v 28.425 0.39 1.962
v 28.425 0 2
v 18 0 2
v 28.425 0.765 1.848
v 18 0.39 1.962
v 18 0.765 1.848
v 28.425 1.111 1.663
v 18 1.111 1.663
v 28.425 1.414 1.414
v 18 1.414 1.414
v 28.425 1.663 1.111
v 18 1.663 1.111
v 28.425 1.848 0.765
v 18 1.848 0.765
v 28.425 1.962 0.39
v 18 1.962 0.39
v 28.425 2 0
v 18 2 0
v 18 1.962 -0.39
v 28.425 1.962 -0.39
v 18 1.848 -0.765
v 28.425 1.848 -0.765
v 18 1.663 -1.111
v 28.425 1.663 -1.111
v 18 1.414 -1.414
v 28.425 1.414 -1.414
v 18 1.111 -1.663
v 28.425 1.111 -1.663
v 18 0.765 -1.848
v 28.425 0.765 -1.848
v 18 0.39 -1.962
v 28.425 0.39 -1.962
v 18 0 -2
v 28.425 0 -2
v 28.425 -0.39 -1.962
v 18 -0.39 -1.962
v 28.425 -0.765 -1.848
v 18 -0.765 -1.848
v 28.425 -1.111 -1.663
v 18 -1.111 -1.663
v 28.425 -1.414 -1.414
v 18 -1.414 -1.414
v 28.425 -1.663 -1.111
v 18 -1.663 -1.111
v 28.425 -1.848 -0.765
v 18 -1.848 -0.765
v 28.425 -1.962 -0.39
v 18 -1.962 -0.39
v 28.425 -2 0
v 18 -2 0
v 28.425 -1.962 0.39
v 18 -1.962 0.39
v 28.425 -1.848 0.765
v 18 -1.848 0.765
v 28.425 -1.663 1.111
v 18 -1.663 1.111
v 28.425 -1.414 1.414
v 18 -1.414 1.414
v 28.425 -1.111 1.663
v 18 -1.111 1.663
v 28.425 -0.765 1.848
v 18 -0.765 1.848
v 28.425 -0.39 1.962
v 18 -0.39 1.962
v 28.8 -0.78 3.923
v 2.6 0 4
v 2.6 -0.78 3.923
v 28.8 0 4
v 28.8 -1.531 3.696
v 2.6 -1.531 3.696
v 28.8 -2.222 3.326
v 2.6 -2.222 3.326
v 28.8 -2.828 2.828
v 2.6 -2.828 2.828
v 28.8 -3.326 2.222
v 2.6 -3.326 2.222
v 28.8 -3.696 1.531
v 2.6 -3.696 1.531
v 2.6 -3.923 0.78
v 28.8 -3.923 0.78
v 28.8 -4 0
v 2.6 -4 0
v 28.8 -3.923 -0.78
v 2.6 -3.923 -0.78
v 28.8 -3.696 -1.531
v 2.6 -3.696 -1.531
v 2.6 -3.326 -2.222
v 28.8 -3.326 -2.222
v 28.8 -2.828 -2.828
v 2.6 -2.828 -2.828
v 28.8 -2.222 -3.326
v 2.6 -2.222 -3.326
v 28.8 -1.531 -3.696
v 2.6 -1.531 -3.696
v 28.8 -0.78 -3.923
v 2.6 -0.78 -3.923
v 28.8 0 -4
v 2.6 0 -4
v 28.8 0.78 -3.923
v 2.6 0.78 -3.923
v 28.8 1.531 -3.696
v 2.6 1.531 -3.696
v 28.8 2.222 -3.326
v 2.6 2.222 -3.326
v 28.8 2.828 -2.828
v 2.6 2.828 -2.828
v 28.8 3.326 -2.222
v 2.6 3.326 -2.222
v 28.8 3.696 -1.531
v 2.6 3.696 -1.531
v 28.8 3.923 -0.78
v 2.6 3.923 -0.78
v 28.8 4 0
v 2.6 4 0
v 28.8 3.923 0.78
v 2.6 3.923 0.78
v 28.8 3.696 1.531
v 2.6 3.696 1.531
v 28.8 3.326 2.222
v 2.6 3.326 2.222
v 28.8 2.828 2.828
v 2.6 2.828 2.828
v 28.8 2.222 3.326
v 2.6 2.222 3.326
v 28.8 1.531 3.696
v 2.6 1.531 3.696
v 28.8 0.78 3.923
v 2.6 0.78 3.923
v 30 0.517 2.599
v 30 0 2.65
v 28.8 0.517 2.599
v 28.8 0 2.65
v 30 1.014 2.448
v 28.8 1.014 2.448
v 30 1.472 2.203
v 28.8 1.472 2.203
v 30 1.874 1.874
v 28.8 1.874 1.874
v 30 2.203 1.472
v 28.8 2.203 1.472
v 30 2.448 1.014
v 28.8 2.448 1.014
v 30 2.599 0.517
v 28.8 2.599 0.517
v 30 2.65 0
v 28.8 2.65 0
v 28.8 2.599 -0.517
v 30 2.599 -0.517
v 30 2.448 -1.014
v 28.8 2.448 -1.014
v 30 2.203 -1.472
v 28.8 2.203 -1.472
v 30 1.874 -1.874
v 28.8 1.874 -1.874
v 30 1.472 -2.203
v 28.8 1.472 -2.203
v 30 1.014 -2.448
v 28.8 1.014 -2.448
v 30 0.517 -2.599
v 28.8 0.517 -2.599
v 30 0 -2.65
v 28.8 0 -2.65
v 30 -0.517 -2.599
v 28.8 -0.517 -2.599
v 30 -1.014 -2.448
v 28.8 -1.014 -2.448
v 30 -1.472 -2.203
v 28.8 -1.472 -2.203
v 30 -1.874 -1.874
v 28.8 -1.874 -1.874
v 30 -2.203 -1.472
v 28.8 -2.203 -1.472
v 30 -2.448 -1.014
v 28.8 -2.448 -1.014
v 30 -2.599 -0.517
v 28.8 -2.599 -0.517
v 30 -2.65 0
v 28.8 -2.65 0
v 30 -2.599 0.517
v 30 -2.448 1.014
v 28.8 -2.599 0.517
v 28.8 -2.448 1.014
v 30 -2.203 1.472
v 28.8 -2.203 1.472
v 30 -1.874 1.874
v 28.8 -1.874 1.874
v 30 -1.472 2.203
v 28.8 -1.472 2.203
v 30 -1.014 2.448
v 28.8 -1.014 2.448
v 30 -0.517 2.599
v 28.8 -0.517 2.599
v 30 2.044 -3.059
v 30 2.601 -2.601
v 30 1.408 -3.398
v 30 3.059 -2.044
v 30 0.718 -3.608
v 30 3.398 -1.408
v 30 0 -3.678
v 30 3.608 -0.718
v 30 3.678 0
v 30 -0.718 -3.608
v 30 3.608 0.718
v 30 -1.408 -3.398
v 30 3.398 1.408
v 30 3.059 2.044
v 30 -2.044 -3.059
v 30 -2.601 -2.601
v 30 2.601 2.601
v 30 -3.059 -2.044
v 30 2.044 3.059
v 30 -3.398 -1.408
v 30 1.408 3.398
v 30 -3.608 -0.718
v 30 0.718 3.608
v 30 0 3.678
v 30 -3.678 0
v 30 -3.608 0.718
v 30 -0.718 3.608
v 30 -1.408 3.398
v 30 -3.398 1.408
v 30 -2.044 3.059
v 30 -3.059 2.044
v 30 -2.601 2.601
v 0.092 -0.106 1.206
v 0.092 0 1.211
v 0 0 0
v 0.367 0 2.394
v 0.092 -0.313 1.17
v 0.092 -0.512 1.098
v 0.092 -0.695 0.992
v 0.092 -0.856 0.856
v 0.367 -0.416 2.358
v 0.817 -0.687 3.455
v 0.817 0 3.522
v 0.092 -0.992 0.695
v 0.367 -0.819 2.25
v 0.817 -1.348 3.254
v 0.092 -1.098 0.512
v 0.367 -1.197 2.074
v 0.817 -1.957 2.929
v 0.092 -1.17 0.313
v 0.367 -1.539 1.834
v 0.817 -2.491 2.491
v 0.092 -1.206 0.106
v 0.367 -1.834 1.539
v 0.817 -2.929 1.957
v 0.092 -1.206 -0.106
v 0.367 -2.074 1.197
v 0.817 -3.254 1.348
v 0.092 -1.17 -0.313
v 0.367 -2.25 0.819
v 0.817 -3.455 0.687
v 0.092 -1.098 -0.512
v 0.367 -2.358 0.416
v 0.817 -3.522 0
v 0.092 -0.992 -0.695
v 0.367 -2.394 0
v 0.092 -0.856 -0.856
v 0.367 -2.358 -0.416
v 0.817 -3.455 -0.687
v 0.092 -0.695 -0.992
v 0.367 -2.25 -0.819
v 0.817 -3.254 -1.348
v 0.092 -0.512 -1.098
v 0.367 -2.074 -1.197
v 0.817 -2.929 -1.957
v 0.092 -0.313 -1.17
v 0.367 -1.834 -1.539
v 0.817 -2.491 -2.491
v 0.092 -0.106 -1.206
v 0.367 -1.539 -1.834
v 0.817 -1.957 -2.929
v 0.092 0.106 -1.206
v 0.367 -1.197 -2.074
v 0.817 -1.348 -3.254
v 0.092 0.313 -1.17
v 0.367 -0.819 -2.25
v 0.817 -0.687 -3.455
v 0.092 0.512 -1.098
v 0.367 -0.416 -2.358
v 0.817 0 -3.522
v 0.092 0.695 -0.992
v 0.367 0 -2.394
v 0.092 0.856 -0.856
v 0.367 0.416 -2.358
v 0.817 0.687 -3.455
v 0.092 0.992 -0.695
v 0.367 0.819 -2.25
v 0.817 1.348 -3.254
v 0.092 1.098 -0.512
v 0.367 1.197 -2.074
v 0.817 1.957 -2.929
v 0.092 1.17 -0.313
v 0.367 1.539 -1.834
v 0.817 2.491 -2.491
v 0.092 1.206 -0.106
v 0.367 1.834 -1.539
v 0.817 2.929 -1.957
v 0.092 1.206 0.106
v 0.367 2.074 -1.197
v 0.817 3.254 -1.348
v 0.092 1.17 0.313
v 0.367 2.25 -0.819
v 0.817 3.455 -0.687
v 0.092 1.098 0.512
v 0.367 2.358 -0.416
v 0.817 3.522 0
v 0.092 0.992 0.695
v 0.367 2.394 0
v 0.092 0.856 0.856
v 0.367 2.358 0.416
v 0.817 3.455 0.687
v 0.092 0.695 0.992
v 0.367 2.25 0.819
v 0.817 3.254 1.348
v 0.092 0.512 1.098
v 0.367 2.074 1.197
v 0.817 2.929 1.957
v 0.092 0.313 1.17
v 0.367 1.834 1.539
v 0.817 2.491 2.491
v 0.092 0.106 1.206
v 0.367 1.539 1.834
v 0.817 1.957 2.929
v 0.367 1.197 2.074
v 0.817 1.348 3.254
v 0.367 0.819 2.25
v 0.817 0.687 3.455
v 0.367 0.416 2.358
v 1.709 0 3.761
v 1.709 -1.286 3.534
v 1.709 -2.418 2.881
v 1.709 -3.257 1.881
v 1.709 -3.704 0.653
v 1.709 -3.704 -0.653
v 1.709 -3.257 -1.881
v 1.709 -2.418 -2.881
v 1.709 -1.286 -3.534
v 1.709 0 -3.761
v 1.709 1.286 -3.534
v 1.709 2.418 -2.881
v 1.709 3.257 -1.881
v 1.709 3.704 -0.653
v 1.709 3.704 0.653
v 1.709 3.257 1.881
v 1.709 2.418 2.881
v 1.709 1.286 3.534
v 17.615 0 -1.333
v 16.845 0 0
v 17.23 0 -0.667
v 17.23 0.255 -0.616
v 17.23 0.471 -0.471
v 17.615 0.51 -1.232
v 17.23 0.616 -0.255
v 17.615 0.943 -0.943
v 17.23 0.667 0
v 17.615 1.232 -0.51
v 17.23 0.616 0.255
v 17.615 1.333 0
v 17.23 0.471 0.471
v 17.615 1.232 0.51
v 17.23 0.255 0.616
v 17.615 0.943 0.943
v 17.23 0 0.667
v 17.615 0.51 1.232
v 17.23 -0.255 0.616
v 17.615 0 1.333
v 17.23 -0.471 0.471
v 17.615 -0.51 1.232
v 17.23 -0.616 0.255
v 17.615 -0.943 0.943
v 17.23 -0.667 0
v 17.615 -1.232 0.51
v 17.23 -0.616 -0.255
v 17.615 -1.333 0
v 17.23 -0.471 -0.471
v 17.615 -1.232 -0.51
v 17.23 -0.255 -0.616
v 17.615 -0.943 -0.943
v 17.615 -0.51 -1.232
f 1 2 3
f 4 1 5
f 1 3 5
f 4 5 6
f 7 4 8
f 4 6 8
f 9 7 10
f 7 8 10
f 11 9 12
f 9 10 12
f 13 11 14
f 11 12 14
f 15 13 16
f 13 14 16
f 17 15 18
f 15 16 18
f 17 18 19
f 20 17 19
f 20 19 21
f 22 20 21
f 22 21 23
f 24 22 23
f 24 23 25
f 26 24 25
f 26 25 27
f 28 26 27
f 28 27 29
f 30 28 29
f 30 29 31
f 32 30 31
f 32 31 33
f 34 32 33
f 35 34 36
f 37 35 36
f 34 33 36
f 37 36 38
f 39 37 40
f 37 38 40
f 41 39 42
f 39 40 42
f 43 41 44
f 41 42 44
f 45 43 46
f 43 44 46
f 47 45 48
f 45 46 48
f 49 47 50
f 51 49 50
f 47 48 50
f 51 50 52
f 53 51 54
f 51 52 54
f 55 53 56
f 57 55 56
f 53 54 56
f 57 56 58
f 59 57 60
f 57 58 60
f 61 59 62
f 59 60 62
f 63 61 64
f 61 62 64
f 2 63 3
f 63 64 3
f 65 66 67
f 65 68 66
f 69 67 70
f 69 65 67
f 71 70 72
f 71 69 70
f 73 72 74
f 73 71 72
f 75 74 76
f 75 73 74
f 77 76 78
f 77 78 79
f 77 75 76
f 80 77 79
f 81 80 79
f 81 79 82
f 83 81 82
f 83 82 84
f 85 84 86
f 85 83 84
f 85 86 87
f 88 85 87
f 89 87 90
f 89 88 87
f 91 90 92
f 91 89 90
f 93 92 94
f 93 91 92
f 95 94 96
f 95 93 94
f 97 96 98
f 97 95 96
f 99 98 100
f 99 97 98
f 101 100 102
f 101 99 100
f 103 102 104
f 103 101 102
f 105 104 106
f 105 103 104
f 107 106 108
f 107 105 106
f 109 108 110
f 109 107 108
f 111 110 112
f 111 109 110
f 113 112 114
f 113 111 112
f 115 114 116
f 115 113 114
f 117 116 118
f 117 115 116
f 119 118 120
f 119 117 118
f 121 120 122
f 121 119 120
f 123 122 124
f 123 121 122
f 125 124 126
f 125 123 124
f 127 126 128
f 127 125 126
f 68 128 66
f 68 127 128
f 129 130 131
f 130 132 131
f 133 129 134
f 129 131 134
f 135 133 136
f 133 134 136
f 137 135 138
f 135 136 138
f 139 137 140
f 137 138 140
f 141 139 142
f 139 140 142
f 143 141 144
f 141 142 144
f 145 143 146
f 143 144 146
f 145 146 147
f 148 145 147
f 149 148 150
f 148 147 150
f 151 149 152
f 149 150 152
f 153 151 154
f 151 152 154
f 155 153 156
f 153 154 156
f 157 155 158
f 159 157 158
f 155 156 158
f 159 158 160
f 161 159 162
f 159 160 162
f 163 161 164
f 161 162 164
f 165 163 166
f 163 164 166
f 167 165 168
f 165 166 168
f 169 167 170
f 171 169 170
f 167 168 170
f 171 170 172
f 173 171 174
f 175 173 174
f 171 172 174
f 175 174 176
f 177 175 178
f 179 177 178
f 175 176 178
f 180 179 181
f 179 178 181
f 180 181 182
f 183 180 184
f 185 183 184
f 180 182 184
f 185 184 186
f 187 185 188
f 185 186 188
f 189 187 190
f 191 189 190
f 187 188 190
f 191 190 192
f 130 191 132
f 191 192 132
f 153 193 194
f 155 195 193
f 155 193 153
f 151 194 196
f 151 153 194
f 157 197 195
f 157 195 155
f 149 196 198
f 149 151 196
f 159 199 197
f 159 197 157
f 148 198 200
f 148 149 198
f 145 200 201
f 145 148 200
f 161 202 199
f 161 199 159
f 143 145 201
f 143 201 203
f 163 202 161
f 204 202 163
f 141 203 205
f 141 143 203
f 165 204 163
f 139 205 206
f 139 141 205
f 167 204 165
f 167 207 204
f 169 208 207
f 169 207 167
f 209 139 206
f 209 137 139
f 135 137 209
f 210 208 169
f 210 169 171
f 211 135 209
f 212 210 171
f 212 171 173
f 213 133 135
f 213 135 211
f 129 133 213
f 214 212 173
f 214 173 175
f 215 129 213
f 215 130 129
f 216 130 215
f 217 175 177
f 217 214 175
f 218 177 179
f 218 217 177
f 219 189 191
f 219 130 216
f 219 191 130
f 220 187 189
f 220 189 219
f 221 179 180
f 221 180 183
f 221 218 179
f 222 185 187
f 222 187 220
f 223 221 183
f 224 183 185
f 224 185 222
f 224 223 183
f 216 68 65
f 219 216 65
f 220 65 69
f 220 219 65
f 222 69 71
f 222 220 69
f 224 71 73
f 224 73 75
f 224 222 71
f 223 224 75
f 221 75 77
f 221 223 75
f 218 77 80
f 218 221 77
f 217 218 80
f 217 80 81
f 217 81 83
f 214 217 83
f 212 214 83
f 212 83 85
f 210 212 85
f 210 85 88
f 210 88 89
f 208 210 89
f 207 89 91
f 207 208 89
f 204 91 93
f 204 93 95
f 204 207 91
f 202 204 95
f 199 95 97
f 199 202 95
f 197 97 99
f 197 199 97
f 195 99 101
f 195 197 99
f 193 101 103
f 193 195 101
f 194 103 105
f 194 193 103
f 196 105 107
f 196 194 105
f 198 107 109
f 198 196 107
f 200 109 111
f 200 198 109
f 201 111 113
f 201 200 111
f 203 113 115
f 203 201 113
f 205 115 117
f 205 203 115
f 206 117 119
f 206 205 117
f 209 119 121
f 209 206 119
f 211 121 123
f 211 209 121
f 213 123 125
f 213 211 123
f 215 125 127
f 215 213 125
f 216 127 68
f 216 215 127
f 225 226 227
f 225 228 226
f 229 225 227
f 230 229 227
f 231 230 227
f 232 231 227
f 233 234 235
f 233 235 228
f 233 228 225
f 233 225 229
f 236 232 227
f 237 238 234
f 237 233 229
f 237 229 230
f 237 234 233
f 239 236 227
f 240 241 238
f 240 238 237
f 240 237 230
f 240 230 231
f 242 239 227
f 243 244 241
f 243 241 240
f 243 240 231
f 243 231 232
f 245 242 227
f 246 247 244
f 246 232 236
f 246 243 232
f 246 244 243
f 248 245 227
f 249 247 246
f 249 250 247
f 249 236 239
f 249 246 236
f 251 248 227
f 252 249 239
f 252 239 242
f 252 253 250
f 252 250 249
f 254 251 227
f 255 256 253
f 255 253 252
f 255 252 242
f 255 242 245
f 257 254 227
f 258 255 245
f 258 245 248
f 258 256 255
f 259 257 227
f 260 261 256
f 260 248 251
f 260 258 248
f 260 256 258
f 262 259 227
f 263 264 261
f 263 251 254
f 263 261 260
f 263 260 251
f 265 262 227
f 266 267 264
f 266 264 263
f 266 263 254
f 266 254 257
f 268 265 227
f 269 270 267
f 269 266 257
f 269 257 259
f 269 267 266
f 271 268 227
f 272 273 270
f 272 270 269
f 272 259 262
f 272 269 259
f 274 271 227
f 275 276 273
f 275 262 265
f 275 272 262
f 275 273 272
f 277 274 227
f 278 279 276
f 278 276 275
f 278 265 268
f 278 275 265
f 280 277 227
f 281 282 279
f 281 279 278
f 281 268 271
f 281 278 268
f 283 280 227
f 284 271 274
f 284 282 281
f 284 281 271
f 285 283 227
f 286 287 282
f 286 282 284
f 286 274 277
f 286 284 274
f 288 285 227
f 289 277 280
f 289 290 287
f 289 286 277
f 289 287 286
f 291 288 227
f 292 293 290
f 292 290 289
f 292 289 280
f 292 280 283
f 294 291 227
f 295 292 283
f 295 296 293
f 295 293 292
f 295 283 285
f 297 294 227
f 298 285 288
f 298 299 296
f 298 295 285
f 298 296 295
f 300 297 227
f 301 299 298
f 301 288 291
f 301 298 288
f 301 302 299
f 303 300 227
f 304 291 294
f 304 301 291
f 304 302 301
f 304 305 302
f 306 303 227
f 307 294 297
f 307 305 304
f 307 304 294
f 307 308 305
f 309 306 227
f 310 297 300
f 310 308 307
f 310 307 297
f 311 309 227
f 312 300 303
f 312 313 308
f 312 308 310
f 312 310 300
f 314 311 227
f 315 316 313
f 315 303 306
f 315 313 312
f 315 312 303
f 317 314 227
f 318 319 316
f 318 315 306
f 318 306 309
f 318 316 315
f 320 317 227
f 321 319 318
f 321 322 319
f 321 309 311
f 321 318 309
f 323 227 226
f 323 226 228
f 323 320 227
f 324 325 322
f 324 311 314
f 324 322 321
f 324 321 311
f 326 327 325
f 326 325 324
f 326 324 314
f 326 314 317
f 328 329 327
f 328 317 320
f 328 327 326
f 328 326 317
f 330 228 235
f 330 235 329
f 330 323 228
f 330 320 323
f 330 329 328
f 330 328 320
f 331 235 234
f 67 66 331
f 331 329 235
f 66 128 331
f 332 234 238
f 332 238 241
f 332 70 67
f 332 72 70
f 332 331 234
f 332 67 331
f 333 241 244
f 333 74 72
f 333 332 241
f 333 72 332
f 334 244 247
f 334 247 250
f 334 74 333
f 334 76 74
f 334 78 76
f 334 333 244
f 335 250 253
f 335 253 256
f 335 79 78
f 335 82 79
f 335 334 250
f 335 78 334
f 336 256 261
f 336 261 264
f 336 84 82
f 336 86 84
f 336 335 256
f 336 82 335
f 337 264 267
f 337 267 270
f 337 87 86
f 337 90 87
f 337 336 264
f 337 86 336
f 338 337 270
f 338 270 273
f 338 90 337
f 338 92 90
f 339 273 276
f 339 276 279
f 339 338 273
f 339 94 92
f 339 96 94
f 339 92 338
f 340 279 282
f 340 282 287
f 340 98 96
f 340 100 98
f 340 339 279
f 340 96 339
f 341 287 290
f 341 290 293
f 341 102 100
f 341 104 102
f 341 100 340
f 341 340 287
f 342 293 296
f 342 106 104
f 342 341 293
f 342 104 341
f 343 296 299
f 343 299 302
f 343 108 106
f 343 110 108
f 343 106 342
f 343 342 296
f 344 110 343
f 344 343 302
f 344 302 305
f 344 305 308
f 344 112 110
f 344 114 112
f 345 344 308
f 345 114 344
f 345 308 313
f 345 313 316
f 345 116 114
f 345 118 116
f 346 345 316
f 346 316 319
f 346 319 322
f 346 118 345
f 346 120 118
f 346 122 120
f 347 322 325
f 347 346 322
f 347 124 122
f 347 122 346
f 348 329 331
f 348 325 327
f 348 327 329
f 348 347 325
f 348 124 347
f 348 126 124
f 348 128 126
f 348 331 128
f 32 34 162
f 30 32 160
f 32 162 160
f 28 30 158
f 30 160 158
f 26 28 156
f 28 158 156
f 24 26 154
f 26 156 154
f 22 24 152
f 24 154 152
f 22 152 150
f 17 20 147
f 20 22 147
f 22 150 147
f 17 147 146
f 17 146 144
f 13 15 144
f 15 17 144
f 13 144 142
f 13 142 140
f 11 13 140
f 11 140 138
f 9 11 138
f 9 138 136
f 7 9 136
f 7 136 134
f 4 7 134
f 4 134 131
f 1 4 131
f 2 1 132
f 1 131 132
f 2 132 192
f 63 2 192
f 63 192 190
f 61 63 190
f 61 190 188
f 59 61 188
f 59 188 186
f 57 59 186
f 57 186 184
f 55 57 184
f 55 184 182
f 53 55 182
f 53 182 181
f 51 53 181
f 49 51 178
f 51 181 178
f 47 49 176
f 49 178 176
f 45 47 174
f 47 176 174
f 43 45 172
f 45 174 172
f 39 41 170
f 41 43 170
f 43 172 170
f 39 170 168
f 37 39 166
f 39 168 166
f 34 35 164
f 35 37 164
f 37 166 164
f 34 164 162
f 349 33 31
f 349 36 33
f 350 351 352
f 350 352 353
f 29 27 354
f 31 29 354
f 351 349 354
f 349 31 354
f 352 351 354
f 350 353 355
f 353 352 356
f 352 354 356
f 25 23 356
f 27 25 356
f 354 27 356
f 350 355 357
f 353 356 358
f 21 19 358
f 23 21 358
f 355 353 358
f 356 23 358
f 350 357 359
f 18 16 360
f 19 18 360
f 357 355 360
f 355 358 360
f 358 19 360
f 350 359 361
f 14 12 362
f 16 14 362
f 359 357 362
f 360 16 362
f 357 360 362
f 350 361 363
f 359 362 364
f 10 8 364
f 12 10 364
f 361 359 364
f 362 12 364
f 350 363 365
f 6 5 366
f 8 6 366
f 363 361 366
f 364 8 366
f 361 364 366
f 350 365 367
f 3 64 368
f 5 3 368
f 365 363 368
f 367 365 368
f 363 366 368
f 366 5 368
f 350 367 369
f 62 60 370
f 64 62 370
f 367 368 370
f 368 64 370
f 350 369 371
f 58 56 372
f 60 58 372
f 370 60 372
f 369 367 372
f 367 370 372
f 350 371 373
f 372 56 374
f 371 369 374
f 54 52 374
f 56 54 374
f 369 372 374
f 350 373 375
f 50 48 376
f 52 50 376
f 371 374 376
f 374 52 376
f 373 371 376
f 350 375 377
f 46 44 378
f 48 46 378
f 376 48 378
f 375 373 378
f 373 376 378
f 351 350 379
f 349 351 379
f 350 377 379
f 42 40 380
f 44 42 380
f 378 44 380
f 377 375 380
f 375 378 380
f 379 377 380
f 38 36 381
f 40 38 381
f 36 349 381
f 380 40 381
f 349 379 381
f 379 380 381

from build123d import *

# Parameters (mm, degrees)
PER_AGE1_D     = 4
PER_AGE1_DEPTH = 12
PER_AGE1_TIP   = 1.154700538
PER_AGE2_D     = 5.3
PER_AGE2_DEPTH = 1.2
PER_AGE2_TIP   = 1.529978213


with BuildPart() as part:
    # Esquisse1 → Base-Révolution (revolve)
    with BuildSketch(Plane.XY, mode=Mode.PRIVATE) as base_r_volution_sk:
        with BuildLine():
            Line((0.817137041, 3.52228331), (2.6, 4))
            Line((2.6, 4), (28.8, 4))
            Line((28.8, 4), (30, 3.678460969))
            Line((30, 3.678460969), (30, 0))
            Line((30, 0), (0, 0))
            ThreePointArc((0, 0), (0.206961322, 1.807912654), (0.817137041, 3.52228331))
        make_face()
    revolve(base_r_volution_sk.sketch.rotate(Axis((-7.062515413, 0, 0), (1, 0, 0)), 90), axis=Axis((-7.062515413, 0, 0), (1, 0, 0)))

    # Perçage1
    with Locations(Plane(origin=(30, 0, 0), x_dir=(0, 0, -1), z_dir=(1, 0, 0))):
        with Locations((0, 0)):
            Hole(PER_AGE1_D / 2, depth=PER_AGE1_DEPTH)
            with Locations((0, 0, -(PER_AGE1_DEPTH + PER_AGE1_TIP / 2))):  # 120° drill point
                Cone(0, PER_AGE1_D / 2, PER_AGE1_TIP, mode=Mode.SUBTRACT)

    # Perçage2
    with Locations(Plane(origin=(30, 0, 0), x_dir=(0, 0, -1), z_dir=(1, 0, 0))):
        with Locations((0, 0)):
            Hole(PER_AGE2_D / 2, depth=PER_AGE2_DEPTH)
            with Locations((0, 0, -(PER_AGE2_DEPTH + PER_AGE2_TIP / 2))):  # 120° drill point
                Cone(0, PER_AGE2_D / 2, PER_AGE2_TIP, mode=Mode.SUBTRACT)


solid = part.part
